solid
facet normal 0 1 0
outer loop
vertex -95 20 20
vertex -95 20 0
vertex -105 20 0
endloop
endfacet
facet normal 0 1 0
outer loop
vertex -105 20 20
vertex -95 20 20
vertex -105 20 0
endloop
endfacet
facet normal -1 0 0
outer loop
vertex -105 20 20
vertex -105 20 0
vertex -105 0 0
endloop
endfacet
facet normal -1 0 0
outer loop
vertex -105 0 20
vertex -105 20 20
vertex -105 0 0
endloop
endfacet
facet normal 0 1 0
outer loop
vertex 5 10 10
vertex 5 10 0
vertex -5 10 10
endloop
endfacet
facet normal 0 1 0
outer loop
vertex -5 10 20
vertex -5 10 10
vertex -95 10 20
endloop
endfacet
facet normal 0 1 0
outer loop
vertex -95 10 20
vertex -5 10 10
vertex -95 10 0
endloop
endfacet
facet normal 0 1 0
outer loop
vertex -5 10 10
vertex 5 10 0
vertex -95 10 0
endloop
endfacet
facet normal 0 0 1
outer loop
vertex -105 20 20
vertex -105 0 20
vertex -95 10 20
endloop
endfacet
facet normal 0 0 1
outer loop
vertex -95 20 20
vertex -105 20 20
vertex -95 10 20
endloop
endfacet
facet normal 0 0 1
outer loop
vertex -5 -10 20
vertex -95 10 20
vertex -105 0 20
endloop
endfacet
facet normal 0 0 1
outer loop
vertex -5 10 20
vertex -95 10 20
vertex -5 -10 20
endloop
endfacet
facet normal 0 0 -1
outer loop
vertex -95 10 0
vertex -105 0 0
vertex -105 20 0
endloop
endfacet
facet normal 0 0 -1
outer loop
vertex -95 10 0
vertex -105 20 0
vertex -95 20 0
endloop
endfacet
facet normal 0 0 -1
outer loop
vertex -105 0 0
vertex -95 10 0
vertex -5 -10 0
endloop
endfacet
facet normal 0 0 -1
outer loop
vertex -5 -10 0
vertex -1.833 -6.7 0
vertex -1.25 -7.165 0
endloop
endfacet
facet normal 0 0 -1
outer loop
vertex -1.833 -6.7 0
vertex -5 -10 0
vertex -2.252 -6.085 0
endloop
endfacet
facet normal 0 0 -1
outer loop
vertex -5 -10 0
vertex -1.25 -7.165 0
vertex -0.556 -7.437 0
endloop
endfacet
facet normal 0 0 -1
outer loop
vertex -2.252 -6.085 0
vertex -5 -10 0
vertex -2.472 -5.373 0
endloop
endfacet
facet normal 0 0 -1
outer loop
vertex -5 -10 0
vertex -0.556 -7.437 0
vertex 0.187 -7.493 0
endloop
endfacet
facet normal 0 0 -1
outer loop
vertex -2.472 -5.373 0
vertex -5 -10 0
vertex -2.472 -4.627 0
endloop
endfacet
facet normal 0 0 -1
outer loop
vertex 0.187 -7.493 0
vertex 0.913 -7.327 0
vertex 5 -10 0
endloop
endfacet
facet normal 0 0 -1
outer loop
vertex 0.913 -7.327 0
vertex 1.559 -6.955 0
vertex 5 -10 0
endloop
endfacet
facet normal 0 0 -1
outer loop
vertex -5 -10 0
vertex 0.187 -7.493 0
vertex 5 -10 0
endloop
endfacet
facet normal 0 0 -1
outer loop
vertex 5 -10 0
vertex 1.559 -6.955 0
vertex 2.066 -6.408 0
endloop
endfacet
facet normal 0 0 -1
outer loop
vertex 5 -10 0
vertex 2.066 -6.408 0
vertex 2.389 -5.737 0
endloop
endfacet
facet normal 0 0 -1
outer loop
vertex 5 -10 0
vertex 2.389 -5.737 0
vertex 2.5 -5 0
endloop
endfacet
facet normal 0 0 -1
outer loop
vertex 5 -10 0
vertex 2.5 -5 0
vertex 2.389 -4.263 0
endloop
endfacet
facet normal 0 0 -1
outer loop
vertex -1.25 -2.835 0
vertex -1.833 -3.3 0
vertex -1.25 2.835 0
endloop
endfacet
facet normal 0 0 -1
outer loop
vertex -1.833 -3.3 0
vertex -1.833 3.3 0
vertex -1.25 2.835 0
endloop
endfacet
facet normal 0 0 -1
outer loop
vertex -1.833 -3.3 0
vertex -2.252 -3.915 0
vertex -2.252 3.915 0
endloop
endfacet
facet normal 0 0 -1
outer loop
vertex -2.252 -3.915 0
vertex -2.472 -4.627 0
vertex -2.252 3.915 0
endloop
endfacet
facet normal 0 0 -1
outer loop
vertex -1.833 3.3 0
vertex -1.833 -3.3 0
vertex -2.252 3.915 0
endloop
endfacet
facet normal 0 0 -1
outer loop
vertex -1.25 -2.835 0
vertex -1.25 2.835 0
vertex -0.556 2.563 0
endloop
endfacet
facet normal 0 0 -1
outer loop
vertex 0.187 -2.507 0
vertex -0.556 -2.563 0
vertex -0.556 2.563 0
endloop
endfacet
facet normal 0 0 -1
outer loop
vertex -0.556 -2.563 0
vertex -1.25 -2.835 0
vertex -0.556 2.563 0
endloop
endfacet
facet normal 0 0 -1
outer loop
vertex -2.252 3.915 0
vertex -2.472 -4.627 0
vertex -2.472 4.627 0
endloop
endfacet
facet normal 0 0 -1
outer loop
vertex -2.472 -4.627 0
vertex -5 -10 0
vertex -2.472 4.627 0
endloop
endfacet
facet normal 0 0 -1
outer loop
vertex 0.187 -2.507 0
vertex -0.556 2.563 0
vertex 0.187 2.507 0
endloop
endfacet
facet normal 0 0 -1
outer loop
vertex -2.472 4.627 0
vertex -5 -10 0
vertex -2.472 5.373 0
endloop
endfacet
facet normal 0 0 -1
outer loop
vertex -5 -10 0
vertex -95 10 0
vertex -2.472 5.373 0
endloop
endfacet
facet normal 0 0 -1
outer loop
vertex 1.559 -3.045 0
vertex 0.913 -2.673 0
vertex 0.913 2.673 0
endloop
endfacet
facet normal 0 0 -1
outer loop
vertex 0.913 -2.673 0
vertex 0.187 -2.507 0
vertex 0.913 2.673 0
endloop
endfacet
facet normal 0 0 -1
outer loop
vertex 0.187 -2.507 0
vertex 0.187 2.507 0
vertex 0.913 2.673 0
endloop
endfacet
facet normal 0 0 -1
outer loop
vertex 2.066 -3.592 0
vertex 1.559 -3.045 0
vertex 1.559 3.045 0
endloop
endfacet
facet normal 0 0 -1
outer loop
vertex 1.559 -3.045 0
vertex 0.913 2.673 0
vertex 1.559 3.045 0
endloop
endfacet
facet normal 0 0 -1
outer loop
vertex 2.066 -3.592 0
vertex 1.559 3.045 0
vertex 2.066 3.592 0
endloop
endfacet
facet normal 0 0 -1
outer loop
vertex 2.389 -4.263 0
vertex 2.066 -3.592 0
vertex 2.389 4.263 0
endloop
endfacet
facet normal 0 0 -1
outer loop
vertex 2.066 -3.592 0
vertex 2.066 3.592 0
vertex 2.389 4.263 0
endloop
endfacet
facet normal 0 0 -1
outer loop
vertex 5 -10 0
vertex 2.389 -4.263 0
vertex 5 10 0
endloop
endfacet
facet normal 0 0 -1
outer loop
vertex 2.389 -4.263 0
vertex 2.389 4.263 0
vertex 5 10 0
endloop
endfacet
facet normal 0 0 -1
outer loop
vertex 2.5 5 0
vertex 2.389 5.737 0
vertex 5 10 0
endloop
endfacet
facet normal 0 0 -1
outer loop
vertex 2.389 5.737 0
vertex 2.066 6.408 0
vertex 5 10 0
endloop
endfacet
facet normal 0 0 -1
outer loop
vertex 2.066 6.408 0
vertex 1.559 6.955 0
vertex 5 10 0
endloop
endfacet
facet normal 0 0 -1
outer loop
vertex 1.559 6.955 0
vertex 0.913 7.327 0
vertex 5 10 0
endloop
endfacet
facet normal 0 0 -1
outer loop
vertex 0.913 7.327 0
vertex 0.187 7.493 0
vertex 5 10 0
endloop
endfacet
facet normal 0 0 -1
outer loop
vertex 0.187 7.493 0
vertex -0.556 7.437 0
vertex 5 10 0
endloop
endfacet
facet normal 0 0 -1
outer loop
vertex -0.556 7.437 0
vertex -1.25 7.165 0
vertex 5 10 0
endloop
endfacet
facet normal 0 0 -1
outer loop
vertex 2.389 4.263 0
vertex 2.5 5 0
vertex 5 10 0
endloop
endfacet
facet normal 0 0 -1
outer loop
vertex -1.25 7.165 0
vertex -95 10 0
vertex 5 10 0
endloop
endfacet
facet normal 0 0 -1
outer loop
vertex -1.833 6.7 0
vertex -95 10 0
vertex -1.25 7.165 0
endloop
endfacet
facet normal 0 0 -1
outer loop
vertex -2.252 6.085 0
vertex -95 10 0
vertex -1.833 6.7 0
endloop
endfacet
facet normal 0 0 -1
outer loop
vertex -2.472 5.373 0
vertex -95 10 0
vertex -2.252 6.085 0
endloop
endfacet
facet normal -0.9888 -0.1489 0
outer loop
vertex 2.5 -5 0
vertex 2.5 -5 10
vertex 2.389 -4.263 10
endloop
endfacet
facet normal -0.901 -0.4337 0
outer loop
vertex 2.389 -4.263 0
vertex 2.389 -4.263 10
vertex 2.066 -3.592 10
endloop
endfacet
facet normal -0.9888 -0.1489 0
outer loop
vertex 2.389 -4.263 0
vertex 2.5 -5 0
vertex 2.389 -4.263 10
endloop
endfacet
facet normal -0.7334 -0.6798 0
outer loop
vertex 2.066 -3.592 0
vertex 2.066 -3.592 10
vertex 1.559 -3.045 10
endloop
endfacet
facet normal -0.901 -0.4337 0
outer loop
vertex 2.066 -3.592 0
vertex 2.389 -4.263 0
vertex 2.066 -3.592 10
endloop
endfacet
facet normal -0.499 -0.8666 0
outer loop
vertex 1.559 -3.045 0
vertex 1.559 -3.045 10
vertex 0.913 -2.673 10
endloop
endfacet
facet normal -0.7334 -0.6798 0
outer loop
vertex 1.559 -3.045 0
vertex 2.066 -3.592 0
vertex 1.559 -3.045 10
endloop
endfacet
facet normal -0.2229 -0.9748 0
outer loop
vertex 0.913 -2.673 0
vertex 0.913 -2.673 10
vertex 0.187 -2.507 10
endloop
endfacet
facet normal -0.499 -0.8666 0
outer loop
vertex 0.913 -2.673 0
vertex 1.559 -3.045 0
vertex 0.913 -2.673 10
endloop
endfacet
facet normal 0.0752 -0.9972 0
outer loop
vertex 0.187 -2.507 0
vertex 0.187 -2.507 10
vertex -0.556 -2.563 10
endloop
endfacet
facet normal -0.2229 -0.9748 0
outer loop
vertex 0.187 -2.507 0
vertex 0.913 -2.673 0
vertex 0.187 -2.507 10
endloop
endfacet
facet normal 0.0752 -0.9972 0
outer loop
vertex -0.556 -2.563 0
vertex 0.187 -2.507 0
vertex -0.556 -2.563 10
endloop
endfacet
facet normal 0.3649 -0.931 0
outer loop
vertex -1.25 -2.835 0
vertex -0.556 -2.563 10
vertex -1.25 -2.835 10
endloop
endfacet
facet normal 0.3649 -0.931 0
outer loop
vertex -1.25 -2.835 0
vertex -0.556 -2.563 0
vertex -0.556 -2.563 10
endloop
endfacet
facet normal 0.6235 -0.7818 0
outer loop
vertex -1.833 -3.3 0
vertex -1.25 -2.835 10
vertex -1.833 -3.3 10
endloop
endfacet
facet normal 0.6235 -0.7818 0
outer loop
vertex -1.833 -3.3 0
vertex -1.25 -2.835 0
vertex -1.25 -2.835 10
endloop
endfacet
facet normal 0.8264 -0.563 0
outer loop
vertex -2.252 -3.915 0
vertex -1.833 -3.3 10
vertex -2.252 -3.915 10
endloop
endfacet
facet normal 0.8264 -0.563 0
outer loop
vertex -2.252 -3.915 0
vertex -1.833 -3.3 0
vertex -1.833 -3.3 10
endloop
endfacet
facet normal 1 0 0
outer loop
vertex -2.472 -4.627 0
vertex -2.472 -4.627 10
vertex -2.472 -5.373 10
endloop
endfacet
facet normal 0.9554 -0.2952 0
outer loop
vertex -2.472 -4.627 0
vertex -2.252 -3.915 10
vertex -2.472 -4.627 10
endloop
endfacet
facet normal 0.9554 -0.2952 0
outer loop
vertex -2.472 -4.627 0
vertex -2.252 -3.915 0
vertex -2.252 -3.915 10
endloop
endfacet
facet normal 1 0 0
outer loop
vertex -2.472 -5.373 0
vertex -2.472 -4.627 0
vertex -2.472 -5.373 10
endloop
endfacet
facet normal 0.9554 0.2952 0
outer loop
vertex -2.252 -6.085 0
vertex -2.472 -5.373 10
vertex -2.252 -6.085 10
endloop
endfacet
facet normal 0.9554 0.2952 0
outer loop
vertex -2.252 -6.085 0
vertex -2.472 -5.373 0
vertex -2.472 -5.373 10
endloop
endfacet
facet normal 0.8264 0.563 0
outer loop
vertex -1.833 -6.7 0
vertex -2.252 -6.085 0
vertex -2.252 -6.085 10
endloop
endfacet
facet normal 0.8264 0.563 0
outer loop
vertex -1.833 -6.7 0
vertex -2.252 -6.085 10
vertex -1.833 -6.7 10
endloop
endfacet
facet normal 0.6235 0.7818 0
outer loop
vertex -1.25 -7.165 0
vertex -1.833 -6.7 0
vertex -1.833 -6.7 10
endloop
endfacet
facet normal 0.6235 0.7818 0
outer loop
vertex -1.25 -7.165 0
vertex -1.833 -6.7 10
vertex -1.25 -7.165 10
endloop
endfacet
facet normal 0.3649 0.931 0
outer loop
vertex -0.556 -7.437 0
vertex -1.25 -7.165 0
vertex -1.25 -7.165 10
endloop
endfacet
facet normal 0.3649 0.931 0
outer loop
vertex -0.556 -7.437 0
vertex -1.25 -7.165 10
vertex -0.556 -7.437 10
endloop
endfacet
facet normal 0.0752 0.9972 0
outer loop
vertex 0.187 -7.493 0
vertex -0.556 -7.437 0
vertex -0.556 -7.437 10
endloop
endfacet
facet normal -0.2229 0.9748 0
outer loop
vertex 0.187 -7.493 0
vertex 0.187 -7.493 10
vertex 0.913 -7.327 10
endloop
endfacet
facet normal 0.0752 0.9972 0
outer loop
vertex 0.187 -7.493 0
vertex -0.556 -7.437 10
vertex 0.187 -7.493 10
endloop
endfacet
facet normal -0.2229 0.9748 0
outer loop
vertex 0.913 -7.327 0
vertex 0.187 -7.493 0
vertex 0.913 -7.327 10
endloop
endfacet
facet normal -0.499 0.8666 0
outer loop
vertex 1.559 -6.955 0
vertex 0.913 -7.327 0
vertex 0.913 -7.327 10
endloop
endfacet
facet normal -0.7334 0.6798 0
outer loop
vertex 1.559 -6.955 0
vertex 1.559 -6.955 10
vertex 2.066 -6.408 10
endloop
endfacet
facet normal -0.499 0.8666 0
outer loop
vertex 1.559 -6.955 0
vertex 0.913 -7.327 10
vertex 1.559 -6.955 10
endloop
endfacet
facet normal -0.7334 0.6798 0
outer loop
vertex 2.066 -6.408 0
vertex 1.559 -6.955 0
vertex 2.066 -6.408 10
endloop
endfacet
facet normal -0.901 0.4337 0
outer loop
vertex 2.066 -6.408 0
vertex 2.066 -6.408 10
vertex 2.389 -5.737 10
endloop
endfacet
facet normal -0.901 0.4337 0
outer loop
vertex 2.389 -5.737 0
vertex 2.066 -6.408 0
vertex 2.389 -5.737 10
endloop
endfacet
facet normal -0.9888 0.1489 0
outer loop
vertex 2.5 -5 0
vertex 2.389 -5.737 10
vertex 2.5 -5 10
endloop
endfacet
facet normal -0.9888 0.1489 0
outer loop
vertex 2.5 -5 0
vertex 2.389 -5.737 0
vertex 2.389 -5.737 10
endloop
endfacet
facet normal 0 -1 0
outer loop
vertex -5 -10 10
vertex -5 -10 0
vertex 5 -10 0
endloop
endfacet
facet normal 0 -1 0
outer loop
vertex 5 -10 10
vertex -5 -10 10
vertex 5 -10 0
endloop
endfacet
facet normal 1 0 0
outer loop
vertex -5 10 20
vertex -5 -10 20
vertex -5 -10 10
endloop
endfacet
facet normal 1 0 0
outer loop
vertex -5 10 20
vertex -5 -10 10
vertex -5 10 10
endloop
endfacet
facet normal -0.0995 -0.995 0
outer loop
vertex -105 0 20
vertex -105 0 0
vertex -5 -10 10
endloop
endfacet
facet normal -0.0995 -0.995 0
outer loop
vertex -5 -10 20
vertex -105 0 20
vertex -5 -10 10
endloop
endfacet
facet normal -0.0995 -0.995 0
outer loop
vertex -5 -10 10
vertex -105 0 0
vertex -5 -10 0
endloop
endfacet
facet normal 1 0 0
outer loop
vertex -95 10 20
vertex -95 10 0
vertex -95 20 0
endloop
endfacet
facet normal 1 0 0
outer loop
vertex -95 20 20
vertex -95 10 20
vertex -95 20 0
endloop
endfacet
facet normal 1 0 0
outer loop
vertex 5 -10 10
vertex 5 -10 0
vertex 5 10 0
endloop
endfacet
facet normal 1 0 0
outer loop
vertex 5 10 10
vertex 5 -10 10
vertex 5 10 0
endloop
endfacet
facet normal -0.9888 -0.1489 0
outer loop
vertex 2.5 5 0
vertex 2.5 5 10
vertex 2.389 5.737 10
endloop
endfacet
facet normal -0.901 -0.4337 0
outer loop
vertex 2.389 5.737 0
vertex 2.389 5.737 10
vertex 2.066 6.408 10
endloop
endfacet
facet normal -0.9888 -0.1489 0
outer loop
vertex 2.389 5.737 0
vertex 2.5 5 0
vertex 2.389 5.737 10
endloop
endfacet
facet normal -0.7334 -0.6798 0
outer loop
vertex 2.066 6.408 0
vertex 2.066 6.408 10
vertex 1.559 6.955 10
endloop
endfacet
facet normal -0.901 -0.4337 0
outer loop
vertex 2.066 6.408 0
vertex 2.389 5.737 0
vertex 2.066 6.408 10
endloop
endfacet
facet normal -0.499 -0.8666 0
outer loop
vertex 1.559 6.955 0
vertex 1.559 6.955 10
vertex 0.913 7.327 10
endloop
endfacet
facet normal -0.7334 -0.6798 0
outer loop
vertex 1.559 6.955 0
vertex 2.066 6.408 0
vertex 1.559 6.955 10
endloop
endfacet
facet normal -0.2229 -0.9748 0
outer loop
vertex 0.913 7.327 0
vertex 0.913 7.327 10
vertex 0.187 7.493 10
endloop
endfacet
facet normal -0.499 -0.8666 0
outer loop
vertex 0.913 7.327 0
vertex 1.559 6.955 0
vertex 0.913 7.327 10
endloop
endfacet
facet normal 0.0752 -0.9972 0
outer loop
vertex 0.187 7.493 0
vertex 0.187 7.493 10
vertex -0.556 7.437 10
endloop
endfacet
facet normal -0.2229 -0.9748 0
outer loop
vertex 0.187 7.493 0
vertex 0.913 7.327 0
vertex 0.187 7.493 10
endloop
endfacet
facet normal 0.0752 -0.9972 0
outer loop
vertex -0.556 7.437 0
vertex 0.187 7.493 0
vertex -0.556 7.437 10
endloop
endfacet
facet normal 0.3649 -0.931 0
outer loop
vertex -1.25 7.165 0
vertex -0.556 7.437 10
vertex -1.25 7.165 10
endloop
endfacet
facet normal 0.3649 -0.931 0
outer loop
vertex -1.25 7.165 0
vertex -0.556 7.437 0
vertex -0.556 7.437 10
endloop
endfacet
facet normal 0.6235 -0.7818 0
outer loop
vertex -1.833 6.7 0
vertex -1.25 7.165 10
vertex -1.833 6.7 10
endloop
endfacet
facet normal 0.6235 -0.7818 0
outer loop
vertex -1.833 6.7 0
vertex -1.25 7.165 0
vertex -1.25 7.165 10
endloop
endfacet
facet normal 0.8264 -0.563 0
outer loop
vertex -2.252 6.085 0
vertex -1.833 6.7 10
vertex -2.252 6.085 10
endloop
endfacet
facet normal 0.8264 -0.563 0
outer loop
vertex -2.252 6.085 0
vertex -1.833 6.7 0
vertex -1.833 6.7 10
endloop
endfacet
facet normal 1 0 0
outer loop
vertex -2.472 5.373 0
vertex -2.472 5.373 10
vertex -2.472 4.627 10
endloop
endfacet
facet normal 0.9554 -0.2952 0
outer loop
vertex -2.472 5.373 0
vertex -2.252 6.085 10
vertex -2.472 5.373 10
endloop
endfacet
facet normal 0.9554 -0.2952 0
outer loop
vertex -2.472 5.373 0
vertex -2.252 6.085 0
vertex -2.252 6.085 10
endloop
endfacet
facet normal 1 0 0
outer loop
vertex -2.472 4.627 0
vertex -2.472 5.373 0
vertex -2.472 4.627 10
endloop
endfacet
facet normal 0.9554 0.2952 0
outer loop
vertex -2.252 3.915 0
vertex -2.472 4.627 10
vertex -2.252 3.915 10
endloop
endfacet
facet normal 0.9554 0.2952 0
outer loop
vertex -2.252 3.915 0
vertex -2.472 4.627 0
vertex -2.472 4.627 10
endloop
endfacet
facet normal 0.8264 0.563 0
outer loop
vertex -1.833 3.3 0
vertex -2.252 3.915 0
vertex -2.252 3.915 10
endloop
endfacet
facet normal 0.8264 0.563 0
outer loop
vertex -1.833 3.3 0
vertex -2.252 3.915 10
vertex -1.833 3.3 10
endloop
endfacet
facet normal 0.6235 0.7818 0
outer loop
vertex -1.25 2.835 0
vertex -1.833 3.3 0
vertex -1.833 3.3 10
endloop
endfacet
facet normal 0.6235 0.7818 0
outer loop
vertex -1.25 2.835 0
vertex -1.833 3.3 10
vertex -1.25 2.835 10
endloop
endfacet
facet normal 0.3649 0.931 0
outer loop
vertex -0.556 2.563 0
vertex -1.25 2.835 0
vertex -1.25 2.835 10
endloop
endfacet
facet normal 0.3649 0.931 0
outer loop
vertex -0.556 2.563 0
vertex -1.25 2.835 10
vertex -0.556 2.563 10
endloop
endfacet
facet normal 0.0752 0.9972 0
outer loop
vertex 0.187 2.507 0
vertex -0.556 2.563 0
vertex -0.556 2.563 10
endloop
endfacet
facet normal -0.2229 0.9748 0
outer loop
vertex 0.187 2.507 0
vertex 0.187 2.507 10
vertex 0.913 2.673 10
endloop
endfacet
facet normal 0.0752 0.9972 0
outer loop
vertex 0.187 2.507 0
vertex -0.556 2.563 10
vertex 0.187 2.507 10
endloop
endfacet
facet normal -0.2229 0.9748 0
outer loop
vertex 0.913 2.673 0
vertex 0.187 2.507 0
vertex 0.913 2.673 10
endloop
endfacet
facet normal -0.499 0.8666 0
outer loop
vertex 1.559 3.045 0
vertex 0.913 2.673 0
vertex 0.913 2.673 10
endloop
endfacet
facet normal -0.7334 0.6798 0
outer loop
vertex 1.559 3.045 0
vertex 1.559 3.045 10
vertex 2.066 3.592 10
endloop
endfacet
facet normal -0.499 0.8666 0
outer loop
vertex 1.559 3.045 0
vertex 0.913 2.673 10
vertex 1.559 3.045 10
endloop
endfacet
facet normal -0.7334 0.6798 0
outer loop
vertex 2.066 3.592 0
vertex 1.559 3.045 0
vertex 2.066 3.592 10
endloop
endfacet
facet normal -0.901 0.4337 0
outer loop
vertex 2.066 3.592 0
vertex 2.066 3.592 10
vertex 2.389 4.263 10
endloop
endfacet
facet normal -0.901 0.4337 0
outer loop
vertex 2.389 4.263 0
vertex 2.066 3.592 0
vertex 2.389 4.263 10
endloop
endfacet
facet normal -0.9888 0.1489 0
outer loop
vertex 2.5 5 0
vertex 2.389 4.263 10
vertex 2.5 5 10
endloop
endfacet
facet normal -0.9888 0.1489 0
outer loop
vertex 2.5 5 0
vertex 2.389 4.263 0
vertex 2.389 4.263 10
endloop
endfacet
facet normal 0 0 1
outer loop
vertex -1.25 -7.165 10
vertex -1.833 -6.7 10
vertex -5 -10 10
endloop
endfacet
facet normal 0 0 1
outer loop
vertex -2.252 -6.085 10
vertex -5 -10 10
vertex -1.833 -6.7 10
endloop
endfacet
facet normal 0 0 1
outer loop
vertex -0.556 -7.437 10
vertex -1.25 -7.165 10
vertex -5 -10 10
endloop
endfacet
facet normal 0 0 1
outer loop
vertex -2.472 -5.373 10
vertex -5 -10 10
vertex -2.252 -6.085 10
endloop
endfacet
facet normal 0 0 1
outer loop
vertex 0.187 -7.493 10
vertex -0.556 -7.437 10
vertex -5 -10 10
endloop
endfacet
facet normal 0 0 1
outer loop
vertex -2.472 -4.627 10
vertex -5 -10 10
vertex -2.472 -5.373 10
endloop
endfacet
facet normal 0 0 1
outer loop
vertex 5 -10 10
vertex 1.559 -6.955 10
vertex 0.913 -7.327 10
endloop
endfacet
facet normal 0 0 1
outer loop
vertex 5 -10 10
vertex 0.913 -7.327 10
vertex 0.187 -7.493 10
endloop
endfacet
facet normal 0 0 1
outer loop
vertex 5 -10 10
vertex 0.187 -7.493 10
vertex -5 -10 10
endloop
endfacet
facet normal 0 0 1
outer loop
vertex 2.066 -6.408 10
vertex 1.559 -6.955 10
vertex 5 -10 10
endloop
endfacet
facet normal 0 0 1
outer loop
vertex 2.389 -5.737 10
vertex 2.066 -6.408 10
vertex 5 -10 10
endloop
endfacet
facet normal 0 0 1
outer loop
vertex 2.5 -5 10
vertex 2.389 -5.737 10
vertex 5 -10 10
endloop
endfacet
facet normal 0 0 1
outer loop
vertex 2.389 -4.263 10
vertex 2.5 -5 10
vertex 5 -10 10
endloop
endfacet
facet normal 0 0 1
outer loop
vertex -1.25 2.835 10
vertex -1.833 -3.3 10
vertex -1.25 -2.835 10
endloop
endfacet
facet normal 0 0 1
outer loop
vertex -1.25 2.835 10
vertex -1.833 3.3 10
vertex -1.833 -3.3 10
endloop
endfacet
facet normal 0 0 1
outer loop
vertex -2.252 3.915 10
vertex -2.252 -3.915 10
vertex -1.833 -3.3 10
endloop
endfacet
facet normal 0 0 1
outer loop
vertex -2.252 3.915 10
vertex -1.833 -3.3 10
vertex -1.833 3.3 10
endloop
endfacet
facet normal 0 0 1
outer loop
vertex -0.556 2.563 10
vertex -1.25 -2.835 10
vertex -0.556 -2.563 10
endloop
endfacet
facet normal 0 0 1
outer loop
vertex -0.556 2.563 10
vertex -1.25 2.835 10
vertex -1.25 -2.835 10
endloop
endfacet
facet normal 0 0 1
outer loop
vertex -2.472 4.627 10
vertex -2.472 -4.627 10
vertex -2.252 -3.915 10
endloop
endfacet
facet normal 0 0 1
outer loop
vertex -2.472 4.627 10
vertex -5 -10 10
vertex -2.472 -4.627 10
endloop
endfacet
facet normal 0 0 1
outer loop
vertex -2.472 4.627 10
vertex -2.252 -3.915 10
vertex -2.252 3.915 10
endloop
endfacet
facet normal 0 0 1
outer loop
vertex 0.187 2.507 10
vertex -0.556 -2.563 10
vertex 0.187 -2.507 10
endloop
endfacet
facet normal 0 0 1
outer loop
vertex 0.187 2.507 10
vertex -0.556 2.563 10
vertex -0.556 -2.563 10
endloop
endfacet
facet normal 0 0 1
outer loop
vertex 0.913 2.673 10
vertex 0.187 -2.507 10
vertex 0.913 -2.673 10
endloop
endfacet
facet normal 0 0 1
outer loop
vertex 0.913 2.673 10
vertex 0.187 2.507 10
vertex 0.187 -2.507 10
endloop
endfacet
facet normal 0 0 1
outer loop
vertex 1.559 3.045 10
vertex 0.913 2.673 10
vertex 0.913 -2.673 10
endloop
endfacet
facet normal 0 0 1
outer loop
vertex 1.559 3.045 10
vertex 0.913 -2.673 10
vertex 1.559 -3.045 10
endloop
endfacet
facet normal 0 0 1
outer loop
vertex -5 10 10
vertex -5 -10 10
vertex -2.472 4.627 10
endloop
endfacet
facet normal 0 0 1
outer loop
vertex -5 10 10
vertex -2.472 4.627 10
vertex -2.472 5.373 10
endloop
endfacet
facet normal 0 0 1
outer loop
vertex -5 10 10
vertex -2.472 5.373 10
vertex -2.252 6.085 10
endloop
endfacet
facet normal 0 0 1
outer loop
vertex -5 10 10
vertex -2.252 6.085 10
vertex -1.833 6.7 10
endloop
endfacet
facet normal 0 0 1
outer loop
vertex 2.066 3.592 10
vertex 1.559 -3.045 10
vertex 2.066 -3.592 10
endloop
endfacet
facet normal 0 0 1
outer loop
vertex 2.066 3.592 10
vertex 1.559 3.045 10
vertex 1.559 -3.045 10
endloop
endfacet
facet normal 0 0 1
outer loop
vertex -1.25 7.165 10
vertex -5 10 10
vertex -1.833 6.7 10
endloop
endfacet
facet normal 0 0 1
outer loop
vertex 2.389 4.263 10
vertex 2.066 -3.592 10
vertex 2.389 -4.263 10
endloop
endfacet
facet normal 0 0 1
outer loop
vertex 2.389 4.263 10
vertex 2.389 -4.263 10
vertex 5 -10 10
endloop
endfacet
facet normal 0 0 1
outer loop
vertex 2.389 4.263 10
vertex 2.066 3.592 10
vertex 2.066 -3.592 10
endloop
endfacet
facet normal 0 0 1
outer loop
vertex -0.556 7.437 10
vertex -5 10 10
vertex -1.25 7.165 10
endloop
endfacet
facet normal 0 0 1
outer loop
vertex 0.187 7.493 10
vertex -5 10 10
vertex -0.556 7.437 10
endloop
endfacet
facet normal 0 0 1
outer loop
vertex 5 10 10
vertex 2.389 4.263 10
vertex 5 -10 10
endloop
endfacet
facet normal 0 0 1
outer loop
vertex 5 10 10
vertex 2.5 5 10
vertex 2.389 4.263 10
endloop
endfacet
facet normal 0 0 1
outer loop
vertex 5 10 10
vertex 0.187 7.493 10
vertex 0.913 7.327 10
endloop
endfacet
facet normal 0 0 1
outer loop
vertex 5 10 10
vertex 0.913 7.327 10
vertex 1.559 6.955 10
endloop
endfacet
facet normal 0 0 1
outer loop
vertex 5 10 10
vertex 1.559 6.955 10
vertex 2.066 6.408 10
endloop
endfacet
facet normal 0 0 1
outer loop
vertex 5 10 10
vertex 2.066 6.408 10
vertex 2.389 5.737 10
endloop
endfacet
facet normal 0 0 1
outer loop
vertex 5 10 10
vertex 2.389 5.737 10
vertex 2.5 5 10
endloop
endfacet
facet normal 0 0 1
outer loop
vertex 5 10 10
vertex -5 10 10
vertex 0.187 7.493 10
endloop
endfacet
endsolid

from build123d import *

# Parameters (mm, degrees)
ESQUISSE1_R             = 2.5
BOSS_EXTRU_1_DEPTH      = 20
ESQUISSE2_W             = 10
ESQUISSE2_H             = 20
ENL_V_MAT_EXTRU_1_DEPTH = 10


with BuildPart() as part:
    # Esquisse1 → Boss.-Extru.1 (new body)
    with BuildSketch(Plane.XY):
        Polygon((-105, 0), (-5, -10), (5, -10), (5, 10), (-5, 10), (-95, 10), (-95, 20), (-105, 20), (-105, 10), align=None)
        with Locations((0, 5)):
            Circle(ESQUISSE1_R, mode=Mode.SUBTRACT)
        with Locations((0, -5)):
            Circle(ESQUISSE1_R, mode=Mode.SUBTRACT)
    extrude(amount=BOSS_EXTRU_1_DEPTH)

    # Esquisse2 → Enlèv. mat.-Extru.1 (cut)
    with BuildSketch(Plane.XY.offset(20)):
        Rectangle(ESQUISSE2_W, ESQUISSE2_H)
    extrude(amount=-ENL_V_MAT_EXTRU_1_DEPTH, mode=Mode.SUBTRACT)


solid = part.part
